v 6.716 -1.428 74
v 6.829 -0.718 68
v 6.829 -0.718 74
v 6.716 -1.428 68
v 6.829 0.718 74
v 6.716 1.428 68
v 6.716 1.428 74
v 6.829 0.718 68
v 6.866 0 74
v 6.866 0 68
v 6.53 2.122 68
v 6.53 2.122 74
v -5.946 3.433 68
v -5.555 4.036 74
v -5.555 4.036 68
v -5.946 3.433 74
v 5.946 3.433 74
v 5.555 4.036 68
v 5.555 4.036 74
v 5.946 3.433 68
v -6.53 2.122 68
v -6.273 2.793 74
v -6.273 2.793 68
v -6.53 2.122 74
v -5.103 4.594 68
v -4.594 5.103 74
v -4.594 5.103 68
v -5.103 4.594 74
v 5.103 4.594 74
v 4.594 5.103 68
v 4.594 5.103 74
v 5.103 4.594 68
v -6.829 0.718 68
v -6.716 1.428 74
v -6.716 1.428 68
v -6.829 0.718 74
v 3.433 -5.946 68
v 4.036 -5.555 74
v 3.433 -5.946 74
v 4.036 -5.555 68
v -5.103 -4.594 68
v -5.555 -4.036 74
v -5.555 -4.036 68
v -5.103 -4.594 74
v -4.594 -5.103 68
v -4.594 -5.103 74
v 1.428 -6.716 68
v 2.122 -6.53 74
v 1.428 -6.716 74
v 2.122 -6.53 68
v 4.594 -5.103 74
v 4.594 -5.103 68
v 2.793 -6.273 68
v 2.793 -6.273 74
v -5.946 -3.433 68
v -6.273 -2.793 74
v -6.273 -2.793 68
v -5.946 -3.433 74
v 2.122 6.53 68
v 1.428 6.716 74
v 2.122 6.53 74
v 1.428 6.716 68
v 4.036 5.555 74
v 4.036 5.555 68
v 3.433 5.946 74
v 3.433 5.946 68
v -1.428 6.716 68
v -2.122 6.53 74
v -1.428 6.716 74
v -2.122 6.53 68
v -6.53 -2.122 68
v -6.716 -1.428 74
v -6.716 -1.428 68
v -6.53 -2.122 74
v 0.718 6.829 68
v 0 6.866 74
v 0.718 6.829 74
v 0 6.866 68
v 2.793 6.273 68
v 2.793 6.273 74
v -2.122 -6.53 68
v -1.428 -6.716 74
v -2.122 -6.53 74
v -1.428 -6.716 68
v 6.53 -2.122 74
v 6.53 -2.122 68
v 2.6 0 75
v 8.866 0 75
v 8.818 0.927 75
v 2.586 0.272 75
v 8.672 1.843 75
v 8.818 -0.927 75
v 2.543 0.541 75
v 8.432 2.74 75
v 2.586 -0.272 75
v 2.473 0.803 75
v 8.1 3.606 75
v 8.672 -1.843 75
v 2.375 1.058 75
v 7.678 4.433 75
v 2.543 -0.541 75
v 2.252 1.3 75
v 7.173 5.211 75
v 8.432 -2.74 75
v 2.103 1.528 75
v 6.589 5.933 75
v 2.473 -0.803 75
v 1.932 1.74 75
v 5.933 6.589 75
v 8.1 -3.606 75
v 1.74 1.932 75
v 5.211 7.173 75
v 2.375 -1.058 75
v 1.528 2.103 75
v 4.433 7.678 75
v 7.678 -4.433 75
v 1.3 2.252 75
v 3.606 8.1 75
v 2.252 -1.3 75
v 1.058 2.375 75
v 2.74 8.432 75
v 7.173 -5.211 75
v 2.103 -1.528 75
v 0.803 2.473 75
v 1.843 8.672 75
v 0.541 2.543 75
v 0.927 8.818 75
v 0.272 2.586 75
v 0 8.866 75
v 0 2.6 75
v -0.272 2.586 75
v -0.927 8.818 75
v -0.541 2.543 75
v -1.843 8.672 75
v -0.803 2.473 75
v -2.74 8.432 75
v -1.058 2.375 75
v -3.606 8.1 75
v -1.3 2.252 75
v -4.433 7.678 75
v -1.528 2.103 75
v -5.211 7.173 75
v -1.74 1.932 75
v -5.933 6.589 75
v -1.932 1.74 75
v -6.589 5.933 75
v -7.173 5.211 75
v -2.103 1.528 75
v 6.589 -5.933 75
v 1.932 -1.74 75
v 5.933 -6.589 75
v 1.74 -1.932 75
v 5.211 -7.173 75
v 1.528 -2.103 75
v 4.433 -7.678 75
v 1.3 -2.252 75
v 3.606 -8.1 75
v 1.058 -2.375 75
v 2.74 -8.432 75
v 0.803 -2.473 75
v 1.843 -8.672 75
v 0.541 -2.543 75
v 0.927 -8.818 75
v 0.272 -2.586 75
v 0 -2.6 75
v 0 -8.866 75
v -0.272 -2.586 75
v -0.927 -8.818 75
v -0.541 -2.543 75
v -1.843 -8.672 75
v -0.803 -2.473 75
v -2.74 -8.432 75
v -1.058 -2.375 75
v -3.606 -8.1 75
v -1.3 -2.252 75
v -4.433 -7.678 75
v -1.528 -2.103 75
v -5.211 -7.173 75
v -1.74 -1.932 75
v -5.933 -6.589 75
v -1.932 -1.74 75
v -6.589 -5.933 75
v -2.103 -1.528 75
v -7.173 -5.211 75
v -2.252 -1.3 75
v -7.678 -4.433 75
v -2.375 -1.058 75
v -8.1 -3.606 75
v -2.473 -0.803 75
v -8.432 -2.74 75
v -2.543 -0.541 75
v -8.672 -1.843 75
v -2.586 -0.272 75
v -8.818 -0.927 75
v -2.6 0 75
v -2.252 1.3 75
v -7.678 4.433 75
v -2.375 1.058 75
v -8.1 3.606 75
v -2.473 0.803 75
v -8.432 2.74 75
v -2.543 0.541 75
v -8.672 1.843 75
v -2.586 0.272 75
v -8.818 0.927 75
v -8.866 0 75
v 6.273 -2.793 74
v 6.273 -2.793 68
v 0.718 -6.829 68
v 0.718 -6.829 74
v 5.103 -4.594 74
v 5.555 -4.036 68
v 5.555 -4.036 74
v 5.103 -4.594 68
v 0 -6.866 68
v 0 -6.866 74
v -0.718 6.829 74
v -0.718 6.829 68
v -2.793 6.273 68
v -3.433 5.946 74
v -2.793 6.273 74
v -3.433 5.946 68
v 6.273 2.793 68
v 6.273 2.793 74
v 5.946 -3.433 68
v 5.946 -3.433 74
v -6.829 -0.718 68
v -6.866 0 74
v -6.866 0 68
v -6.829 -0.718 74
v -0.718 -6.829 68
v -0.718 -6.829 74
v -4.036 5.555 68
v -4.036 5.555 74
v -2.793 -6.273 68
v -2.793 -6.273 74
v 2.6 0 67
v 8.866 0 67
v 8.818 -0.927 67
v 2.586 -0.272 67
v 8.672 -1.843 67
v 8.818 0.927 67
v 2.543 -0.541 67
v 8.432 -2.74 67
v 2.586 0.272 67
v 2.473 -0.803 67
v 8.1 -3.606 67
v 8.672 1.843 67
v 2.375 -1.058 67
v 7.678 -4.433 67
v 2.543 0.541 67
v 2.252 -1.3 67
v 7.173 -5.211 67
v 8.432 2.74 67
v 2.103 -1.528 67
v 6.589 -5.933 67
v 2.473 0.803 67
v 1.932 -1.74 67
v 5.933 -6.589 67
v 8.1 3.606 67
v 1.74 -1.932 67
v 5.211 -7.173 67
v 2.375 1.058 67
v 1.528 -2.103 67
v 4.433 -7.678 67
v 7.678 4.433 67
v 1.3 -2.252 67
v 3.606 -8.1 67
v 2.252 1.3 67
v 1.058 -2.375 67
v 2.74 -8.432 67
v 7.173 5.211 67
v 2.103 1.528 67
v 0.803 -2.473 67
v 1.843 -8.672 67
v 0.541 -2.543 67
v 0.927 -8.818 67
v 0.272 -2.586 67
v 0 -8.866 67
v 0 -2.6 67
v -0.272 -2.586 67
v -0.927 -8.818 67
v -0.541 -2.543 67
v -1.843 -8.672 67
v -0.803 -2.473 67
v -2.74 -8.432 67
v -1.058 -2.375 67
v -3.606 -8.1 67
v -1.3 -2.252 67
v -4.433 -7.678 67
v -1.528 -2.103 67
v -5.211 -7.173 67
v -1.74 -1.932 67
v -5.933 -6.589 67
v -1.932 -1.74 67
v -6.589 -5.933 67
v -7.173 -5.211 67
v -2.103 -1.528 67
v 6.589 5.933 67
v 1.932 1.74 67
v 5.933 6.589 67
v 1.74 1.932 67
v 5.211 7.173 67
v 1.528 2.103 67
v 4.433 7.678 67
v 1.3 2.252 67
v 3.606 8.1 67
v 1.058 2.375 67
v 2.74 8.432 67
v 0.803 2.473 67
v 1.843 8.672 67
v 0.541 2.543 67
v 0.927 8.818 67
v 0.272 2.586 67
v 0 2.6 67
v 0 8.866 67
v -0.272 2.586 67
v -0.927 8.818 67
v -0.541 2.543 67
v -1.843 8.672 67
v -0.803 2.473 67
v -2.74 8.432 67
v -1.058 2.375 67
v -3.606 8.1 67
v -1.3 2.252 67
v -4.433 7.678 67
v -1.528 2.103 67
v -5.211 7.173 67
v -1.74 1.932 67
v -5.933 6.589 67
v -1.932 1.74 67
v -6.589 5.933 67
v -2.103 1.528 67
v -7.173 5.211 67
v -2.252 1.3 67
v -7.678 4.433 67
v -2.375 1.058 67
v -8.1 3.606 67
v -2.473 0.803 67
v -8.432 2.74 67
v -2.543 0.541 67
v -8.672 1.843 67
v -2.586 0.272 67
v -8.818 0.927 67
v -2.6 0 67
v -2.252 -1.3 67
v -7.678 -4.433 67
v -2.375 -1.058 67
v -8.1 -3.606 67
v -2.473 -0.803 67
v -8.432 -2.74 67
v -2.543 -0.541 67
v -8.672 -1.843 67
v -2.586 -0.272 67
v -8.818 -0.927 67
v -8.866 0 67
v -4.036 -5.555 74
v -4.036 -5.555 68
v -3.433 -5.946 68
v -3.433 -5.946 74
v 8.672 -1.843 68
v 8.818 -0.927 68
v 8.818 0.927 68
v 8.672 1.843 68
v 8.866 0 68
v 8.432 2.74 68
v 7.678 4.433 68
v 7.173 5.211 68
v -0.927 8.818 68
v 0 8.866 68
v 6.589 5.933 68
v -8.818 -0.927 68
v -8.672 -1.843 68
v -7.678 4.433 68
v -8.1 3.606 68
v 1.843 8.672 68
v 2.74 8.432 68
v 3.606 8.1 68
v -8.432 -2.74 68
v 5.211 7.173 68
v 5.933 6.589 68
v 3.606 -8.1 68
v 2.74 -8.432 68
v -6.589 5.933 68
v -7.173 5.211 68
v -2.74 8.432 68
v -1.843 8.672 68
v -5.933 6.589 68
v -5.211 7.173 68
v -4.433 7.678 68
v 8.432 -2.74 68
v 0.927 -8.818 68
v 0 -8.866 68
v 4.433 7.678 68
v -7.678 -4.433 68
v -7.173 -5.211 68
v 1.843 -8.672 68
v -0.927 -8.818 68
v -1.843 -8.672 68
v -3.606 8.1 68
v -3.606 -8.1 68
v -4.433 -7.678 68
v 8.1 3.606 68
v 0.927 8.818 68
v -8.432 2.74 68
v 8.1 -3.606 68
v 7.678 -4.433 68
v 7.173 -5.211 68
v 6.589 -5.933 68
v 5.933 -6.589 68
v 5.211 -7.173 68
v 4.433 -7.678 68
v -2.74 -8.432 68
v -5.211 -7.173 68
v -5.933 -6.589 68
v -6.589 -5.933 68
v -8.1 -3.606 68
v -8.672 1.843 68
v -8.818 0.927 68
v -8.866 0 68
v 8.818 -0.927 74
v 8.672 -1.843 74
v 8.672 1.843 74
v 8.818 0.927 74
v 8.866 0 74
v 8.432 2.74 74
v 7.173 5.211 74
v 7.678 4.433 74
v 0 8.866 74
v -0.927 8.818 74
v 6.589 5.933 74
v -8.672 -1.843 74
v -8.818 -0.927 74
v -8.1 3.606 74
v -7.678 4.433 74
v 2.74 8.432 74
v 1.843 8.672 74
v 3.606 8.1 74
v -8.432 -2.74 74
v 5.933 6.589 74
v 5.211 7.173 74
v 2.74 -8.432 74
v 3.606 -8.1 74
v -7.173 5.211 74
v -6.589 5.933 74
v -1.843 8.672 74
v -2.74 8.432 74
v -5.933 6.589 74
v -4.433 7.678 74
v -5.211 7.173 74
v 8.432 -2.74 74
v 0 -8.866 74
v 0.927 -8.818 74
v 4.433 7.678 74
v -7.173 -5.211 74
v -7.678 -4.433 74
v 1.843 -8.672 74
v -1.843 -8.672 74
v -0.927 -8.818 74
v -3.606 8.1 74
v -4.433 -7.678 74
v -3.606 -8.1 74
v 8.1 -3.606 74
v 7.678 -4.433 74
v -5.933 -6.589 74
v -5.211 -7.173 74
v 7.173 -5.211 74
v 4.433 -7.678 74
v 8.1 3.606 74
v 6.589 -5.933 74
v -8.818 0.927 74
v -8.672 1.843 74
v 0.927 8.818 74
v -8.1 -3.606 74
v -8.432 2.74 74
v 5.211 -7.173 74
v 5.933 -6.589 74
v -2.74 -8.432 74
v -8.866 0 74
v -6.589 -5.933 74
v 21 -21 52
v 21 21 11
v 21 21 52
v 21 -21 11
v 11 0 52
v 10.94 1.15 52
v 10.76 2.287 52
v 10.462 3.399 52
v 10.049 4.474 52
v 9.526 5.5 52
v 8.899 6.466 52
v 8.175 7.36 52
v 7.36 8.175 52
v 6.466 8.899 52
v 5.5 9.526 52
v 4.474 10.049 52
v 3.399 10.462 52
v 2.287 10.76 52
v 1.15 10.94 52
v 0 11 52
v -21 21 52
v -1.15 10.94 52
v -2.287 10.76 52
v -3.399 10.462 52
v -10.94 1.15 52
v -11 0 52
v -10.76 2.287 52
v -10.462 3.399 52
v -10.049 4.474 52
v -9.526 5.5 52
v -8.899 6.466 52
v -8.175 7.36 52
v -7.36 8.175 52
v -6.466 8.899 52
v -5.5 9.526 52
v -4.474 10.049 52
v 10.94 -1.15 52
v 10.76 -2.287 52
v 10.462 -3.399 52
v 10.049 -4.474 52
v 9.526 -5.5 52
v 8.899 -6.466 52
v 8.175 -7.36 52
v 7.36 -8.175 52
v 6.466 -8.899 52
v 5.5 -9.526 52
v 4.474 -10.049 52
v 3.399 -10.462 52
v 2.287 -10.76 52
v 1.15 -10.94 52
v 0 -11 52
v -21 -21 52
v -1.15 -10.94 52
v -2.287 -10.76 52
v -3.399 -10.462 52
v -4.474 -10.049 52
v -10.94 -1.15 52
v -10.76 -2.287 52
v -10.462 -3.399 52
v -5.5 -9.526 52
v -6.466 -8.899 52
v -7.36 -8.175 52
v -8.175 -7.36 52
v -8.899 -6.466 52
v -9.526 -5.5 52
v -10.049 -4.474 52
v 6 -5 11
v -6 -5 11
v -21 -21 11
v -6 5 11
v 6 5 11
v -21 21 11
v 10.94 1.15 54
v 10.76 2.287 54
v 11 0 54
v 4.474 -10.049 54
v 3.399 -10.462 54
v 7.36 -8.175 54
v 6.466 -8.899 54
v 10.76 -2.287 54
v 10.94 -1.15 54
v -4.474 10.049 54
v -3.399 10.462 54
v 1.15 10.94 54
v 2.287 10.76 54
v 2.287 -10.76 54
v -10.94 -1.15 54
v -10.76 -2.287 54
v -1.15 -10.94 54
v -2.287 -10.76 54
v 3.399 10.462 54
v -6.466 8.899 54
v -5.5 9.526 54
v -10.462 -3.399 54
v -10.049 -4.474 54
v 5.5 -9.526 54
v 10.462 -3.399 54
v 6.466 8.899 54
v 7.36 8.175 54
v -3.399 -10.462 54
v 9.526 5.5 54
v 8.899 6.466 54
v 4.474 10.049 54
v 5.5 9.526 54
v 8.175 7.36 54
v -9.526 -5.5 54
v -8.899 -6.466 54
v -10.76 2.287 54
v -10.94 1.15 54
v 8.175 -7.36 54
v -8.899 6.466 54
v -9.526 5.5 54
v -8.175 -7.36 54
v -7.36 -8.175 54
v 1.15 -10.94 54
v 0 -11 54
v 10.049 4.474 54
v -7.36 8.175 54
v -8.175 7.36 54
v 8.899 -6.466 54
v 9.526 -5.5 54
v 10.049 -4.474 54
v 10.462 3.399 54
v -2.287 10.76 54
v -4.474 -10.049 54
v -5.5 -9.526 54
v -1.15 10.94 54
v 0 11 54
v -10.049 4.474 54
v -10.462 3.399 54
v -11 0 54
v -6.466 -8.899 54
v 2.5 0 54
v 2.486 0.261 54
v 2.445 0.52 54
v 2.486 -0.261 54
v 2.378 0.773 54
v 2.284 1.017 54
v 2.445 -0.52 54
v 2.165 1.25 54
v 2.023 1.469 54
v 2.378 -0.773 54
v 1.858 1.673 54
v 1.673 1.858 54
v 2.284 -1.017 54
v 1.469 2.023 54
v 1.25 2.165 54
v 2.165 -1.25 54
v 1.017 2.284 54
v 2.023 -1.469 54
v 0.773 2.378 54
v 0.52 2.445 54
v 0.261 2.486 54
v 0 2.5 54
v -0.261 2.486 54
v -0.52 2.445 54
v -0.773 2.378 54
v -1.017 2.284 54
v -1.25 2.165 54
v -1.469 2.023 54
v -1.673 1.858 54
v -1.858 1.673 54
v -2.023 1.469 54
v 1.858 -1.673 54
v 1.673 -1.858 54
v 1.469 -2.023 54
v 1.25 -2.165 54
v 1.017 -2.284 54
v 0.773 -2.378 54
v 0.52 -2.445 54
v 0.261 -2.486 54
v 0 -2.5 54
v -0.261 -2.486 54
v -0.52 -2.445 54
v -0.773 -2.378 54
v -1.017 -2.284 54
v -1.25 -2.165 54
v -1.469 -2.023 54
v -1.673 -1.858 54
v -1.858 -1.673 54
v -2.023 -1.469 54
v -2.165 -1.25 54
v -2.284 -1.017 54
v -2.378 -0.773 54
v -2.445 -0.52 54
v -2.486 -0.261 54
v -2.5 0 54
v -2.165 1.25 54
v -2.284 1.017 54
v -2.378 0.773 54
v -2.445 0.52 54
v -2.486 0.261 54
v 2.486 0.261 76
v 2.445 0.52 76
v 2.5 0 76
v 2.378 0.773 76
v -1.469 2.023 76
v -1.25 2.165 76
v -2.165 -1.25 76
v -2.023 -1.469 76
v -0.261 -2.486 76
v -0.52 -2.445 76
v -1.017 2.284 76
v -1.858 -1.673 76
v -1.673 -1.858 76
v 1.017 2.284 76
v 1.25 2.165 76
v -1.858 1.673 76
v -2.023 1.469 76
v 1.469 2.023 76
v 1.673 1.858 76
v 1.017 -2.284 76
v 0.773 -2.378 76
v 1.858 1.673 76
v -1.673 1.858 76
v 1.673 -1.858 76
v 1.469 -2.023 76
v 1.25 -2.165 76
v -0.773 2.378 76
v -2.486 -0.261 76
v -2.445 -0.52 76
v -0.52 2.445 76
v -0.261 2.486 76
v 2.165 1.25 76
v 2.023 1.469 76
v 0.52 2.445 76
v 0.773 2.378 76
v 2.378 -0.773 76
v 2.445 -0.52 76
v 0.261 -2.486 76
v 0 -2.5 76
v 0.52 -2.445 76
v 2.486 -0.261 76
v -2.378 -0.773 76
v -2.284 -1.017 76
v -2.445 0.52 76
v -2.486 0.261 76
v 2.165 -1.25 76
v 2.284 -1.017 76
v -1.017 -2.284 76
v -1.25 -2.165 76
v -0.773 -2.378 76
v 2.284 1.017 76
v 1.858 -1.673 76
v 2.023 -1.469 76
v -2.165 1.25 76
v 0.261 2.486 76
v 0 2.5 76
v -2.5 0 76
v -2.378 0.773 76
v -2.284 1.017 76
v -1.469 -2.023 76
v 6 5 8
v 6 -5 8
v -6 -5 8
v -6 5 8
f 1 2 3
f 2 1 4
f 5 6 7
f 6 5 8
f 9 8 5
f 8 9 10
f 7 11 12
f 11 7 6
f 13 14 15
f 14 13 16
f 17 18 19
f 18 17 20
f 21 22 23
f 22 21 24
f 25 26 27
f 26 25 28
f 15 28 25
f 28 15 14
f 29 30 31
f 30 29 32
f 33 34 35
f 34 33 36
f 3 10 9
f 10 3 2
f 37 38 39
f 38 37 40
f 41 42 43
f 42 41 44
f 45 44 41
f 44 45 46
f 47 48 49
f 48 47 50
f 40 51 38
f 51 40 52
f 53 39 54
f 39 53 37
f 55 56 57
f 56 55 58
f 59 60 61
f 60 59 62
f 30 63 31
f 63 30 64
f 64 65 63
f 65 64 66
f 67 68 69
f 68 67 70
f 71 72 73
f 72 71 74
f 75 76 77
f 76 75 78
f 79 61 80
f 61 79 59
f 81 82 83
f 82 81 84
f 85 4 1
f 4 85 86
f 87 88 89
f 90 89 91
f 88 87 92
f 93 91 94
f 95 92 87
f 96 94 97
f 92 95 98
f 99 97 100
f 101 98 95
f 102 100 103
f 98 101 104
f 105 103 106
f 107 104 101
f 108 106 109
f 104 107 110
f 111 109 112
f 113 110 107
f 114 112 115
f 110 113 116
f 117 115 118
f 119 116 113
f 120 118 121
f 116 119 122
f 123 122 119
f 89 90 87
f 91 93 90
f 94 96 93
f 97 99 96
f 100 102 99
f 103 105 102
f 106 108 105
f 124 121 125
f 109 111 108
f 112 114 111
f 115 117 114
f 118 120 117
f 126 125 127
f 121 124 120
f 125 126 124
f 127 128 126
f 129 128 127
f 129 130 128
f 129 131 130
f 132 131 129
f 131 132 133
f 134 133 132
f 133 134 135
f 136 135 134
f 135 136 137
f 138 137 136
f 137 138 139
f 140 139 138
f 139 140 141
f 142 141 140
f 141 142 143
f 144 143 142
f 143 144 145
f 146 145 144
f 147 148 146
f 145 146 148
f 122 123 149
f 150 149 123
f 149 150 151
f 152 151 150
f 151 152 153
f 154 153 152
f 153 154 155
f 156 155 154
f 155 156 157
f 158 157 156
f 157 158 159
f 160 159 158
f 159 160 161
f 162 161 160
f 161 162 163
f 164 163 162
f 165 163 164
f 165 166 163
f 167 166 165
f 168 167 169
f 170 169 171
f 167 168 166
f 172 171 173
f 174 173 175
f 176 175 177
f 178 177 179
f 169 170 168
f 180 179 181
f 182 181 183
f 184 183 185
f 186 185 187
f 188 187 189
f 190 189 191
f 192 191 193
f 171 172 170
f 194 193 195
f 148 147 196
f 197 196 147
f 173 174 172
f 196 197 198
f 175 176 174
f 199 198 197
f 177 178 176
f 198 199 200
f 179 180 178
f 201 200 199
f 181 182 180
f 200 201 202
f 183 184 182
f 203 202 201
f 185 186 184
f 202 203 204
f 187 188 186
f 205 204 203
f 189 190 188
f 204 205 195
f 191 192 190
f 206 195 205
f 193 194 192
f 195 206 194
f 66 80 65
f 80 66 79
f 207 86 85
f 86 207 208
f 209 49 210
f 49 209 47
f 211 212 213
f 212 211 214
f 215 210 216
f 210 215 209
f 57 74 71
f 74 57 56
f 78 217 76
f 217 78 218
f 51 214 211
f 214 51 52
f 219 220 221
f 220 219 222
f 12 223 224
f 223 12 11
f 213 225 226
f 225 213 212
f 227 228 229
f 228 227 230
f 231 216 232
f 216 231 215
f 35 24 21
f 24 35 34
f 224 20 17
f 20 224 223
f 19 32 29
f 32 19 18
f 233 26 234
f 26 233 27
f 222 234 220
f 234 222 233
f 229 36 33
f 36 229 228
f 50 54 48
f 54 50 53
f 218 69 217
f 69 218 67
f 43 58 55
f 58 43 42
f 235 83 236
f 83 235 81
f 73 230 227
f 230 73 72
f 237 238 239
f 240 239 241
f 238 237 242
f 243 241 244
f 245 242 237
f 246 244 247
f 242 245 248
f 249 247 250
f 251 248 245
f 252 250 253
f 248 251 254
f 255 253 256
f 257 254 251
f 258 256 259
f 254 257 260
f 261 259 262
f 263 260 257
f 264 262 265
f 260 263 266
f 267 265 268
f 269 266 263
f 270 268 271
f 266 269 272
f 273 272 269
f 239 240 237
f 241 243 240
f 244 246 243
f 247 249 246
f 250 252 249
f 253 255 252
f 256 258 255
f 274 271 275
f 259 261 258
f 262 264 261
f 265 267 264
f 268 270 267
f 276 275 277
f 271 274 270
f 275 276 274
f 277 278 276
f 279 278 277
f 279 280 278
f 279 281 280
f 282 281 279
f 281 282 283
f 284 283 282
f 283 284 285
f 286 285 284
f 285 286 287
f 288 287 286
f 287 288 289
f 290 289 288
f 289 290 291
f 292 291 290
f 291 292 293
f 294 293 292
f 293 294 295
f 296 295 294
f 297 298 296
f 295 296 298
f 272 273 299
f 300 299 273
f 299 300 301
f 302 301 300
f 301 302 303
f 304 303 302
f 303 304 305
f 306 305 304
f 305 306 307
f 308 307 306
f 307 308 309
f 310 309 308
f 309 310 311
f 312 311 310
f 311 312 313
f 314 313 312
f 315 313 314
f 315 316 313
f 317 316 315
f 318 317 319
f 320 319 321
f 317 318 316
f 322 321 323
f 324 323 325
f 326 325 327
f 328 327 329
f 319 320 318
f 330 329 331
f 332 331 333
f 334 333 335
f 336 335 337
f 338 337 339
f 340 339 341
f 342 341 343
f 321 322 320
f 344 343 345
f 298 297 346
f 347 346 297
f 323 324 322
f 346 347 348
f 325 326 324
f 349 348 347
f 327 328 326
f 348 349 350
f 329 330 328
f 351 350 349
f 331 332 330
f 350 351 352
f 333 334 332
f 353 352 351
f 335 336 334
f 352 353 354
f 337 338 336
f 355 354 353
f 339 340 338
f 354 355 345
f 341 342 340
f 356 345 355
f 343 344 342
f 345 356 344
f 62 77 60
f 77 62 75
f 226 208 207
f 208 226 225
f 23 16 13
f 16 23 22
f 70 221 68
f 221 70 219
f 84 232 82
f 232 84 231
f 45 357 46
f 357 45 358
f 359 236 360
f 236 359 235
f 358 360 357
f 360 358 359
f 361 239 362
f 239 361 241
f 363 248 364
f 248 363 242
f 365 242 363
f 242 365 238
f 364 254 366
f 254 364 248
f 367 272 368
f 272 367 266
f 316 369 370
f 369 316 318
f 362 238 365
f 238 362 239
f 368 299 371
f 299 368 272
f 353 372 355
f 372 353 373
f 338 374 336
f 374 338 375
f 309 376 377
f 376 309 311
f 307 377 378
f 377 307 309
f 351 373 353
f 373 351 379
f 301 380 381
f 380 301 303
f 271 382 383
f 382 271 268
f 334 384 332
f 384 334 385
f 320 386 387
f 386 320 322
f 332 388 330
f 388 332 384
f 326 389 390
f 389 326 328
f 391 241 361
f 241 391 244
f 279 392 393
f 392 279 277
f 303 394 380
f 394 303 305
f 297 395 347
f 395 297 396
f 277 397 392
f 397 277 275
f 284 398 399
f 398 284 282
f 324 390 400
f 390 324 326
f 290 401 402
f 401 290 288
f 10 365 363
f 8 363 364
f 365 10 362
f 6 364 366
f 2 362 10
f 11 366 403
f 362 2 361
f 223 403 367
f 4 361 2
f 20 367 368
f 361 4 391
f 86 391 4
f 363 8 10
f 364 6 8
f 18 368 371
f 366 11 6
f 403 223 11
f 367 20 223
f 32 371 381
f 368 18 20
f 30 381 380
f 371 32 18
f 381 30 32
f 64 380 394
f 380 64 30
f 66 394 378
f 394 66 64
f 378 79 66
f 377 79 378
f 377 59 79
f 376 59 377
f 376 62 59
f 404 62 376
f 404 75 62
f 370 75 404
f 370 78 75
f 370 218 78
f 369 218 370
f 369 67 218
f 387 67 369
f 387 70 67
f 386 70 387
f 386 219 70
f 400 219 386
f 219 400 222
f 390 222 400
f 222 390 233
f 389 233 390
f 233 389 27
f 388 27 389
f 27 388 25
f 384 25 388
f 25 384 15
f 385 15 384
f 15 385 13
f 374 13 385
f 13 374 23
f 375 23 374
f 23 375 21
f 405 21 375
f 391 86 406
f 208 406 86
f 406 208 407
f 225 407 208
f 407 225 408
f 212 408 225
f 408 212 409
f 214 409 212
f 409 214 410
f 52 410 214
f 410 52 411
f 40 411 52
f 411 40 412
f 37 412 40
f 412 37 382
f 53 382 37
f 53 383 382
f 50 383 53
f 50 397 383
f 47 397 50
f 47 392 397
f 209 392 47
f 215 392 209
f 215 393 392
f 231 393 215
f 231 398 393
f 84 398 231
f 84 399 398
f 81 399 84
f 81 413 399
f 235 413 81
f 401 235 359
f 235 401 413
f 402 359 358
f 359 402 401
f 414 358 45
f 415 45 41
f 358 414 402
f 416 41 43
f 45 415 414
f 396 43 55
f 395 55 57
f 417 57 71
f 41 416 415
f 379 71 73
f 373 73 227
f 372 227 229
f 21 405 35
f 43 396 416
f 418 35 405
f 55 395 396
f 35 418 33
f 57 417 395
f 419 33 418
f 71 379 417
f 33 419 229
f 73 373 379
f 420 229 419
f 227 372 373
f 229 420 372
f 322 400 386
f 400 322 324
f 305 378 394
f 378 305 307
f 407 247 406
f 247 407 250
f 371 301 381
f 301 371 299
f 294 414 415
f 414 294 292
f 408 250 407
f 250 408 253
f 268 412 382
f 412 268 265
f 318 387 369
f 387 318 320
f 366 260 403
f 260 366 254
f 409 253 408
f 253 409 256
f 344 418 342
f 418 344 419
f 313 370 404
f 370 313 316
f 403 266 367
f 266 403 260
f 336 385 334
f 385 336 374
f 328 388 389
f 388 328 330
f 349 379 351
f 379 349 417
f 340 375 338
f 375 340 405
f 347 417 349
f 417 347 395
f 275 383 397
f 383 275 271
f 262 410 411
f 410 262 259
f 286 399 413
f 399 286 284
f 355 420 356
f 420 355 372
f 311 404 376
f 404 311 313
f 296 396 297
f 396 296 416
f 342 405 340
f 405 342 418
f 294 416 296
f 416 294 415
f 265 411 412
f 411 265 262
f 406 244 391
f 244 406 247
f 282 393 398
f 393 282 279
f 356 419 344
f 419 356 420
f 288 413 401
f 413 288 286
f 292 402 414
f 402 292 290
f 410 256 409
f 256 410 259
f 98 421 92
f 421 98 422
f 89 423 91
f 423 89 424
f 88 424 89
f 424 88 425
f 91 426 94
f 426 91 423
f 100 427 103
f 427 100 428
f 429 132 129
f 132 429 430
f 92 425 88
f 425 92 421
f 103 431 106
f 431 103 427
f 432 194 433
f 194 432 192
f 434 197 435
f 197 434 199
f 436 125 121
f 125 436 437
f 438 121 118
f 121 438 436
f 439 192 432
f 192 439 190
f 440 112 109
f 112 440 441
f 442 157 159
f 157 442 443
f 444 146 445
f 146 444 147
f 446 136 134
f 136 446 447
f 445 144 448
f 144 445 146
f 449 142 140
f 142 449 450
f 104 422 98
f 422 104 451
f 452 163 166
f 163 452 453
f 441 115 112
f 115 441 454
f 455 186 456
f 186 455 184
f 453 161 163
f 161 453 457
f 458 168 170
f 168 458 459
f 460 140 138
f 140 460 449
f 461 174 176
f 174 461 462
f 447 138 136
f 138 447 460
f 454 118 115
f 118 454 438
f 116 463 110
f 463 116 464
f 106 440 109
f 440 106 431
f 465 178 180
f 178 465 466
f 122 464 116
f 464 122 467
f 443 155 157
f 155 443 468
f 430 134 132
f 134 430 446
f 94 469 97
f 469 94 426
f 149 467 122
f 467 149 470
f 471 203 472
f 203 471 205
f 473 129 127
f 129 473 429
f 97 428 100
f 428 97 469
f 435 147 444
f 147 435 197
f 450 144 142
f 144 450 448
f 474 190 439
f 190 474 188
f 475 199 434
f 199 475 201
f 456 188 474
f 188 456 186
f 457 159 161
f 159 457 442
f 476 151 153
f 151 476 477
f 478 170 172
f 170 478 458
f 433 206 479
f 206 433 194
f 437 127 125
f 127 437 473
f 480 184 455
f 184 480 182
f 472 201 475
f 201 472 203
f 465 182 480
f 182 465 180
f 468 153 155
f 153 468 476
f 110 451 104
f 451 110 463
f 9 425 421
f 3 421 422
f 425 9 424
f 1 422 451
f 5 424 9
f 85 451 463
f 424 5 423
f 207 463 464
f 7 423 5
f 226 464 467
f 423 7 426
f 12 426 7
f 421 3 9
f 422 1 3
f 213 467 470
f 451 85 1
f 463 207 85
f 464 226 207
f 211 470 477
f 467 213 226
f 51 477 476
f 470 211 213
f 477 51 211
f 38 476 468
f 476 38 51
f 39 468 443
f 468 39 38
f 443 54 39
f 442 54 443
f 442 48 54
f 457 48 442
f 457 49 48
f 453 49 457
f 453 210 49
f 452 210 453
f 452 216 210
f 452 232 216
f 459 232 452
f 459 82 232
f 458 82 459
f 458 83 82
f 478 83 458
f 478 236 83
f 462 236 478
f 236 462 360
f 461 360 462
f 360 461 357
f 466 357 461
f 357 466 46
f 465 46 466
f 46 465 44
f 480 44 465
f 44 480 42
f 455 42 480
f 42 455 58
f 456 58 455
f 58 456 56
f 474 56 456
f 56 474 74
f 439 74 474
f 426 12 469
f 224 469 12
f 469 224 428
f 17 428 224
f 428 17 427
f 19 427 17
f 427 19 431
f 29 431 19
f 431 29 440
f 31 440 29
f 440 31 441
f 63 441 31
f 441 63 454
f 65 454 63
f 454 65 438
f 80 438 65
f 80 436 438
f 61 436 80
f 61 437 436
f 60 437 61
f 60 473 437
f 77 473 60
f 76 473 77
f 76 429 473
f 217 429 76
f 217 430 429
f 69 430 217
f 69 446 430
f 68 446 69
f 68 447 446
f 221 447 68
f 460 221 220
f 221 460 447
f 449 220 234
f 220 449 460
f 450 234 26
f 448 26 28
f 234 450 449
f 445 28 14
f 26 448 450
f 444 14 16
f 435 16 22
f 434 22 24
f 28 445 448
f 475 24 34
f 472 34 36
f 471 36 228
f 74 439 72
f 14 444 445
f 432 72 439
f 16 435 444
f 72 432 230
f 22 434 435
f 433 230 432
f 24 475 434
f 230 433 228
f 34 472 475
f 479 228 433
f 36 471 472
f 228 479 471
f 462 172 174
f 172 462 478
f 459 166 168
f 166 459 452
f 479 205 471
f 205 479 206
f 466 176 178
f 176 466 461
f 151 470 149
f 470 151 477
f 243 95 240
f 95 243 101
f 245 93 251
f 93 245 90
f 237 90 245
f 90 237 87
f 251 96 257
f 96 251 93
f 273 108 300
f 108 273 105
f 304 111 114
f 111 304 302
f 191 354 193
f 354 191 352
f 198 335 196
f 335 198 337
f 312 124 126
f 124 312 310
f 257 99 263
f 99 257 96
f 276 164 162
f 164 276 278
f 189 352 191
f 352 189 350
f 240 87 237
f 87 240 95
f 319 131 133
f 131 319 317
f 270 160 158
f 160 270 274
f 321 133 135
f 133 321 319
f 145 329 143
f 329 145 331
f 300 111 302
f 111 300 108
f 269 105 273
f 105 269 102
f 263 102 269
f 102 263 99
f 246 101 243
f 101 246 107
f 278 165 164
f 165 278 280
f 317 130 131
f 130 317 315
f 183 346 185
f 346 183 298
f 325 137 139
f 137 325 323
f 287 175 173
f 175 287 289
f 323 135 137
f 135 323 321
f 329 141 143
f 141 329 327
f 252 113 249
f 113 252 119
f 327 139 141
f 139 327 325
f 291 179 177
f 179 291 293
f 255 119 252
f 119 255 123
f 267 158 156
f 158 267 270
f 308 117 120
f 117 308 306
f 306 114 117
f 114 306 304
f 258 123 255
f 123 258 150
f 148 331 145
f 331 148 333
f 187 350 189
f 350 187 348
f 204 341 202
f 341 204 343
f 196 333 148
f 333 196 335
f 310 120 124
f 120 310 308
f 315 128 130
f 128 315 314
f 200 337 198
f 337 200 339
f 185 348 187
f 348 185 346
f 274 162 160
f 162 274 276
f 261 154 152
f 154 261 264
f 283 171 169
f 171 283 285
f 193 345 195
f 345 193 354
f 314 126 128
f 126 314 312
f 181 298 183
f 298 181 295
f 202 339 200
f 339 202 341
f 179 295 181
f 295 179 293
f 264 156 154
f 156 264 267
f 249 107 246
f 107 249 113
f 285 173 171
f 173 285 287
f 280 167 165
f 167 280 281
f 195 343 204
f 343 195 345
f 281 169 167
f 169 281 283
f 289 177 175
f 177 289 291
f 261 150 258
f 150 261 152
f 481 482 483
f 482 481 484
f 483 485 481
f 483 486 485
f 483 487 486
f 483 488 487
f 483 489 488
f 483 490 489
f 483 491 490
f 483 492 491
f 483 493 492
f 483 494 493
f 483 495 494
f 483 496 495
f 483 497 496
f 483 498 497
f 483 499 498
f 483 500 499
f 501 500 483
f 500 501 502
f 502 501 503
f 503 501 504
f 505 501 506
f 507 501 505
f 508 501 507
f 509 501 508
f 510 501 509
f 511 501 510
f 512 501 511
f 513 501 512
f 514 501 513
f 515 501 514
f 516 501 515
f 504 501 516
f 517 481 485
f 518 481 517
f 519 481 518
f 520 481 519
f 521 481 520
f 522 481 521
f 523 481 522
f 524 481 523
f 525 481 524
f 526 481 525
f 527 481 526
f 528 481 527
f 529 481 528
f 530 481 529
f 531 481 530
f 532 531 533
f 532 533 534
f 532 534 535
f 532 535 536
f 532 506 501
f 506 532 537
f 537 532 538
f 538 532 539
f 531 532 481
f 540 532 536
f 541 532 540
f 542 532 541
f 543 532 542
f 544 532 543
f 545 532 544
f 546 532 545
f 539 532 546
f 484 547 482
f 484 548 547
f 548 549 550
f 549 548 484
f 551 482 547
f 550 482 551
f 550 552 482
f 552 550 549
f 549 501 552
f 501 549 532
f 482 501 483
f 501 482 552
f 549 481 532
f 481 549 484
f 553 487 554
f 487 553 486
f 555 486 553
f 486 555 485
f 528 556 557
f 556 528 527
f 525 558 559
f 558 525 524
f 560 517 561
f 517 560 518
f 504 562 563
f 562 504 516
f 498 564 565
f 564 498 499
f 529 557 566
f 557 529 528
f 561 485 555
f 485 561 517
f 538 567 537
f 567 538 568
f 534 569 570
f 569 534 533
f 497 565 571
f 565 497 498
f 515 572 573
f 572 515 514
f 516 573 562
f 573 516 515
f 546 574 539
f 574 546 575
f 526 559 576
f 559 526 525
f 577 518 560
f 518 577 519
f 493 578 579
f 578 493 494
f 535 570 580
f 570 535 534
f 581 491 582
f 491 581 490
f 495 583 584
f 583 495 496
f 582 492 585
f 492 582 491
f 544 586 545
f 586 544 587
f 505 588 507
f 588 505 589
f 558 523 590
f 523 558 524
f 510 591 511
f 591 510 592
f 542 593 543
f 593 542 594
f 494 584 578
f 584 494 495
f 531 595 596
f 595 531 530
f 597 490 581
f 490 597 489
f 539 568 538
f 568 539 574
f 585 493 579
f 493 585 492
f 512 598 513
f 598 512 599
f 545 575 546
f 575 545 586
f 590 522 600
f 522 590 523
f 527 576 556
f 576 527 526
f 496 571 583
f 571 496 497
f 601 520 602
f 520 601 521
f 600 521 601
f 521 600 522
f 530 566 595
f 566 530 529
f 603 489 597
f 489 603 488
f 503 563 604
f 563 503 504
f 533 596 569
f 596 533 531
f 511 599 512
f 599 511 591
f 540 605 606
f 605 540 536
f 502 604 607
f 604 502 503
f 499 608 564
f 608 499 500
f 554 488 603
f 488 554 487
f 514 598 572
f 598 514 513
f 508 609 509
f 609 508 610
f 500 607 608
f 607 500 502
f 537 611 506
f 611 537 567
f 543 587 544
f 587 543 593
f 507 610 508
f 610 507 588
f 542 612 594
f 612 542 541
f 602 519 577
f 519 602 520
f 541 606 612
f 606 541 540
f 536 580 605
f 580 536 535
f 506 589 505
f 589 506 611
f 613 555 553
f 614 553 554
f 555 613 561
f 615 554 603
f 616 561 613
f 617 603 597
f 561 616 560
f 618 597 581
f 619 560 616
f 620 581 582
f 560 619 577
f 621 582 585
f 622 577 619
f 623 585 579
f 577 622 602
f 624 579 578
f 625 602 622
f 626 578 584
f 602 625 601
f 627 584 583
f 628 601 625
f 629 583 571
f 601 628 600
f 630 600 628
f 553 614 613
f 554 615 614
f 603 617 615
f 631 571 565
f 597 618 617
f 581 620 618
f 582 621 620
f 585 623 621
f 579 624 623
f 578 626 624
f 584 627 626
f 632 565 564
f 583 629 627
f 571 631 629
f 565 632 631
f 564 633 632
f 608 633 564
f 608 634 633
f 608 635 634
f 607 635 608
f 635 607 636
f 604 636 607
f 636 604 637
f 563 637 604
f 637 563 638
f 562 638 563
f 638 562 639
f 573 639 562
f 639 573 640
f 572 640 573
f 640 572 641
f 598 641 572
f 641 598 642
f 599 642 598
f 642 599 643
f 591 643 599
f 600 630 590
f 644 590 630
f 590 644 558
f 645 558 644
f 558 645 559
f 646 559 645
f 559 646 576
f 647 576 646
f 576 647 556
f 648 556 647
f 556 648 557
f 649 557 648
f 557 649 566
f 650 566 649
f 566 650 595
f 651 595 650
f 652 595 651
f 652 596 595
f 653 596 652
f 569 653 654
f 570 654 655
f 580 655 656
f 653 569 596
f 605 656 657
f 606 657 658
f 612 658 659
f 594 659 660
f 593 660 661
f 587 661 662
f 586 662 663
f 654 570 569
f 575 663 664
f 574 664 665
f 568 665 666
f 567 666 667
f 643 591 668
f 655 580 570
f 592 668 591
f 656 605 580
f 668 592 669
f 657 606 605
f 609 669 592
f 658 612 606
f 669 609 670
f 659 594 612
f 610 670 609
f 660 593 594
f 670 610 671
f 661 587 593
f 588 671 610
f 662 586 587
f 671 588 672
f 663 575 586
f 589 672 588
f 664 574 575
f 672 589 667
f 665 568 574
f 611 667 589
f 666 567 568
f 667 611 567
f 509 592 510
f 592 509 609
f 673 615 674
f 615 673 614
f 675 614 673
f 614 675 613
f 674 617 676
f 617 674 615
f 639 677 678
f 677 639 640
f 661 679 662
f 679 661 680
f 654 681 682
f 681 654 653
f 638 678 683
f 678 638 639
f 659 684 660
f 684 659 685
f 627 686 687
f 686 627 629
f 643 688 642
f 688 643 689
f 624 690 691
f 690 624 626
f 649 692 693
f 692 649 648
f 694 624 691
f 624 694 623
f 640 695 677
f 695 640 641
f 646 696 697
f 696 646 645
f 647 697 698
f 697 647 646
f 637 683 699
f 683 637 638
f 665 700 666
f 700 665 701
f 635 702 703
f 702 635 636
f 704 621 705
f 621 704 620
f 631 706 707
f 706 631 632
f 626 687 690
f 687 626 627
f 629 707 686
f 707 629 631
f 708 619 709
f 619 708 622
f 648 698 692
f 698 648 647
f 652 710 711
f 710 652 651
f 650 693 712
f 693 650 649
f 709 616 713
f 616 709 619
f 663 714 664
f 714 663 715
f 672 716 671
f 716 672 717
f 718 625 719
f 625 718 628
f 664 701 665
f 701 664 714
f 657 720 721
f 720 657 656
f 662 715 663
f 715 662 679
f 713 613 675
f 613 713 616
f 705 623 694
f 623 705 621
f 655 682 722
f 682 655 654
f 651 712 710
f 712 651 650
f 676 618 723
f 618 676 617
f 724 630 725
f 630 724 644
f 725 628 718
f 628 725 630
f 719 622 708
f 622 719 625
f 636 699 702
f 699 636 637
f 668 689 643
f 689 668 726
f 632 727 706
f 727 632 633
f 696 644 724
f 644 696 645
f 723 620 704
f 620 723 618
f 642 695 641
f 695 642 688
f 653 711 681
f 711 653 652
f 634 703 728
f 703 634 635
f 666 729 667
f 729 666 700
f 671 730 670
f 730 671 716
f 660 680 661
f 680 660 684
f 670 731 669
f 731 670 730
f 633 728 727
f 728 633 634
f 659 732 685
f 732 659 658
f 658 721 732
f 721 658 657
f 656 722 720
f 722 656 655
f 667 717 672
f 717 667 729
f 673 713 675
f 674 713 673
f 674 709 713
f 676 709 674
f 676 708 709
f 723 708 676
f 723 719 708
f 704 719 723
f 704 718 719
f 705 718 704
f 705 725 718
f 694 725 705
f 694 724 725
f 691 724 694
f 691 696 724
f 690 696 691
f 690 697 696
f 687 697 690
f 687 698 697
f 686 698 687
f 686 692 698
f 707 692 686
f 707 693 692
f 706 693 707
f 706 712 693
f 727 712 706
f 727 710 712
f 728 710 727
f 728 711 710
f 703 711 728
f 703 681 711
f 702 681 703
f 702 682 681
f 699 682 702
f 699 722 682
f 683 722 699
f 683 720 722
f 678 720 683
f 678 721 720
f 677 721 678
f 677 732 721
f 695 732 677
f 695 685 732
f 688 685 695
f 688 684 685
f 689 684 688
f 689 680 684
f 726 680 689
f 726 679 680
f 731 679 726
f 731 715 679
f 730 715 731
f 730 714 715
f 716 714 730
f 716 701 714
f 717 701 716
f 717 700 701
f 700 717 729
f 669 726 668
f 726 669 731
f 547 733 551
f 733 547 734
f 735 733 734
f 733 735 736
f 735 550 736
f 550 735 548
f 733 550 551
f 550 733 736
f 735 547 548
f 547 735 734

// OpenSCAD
// file: _params.scad
// =========================================================================
// 공유 파라미터 (모든 개별 부품 파일에서 include)
// 메인 어셈블리: cup_z_x_catrage_frame_water_mic_anti_3030.scad 에서 추출
// 프레임: 600 × 420 × 700mm (3030 프로파일, Y=0 대칭)
// =========================================================================

$fn = 60;  // 부품 출력용 고해상도
GLOBAL_TOLERANCE = 0.2;

// --- [1] 하부 기성품 및 원통 파라미터 ---
X_RAIL_LEN = 290.0;
X_BLOCK_W = 30.0; X_BLOCK_L = 32.0;   // 신규 X슬라이더 블록 (폭 30mm × 길이 32mm)
X_PITCH_X = 20.0; X_PITCH_Y = 20.0;   // 체결 홀 피치 (20 × 20mm, M3 나사탭 4개)
X_RAIL_W = 30.0;  X_RAIL_H = 20.0;   // 레일 폭 30mm (레일 바닥~블록 윗면 높이 29mm 반영)
X_TOTAL_H = 29.0;                    // 레일 바닥에서 슬라이더 블록 윗면까지의 높이

MOTOR_W = 42.0;      MOTOR_PITCH = 31.0; MOTOR_HOLE_D = 3.5;    
MOTOR_BOSS_D = 22.0; MOTOR_BOSS_H = 2.0; SCREW_D = 8.0;         
MOT_BODY_L = 41.0;   SHAFT_L = 24.0;     // 실측 NEMA17 몸통 41mm / 축 돌출 24mm

CUP_ID = 99.5;  CUP_WALL = 5.0; CUP_OD = 110.0;     // 아크릴 원통 OD110/ID100
CUP_H = 180.0;   CAGE_H = 60.0;  FLOOR_H = 10.0; PISTON_H = 20.0;     

LIP_D = 30.0;    LIP_H = 5.0;    LEAK_DRAIN_D = 4.0;    
GUIDE_PIPE_D = 8.0; BUSHING_OD = 12.0; BUSHING_H = 8.0;       
DRAIN_RADIUS = 35.0; DRAIN_D = 8.0;        

Y_OFFSET = 85.0; BRKT_H = 12.0; BRKT_D = 122.0; BRKT_ID = 62.0; Z_MOUNT_PCD = 86.0;   

// --- [2] 아크릴 파이프 및 상부 카트리지 ---
ACRYL_ID = 100.0; ACRYL_T = 5.0; ACRYL_OD = ACRYL_ID + (ACRYL_T * 2);  // OD110 (아크릴집 106 재고없음 → 컵과 동일 규격)

REVOLVER_PCD = 240.0;     // 인접 카트리지 웹 9.8mm 확보 (OD110 대응, 230→240)
CARTRIDGE_OD = REVOLVER_PCD + ACRYL_OD + 8; 
TOP_PLATE_H = 15.0;       // 아크릴 15T 통판 (보스홀 단 깊이 10mm)

HUB_D = 60.0;            
SHAFT_D = 12.0;          
HUB_WALL = 4.0;          
HUB_H = 15.0;             // 아크릴 5T × 3장 적층 — 파이프 130mm 대응
POCKET_DEPTH = 5.0;
MID_HUB_Z = 63.5;          // 중단 허브 하면 Z (벨트 중심 Z=71.0mm 정렬, 풀리 상단 Z=75.0mm = 축상단-1mm)
UPPER_HUB_Z = 135.0;       // 상단 허브 하면 Z (전체 135+15=150 유지)
BOSS_OD = 35.0;
BOSS_H = 11.0;             // 보스11 + 와셔1 = 12, 리세스10 → 허브 2mm 공중

// --- [3] GT2 벨트 구동 시스템 ---
GT2_PITCH     = 2.0;
GT2_BELT_W    = 6.0;
BIG_PULLEY_TEETH = 566;
BIG_PULLEY_PD = BIG_PULLEY_TEETH * GT2_PITCH / PI;
BIG_PULLEY_OD = BIG_PULLEY_PD + 1.0;
SMALL_PULLEY_TEETH = 20;
SMALL_PULLEY_PD = SMALL_PULLEY_TEETH * GT2_PITCH / PI;
SMALL_PULLEY_OD = SMALL_PULLEY_PD + 1.0;

BELT_MOTOR_X = -300;
BELT_MOTOR_Y = -155.5;
BRKT_MOTOR_H = 25.0;
BRKT_MOTOR_W = 45.0;        // 브래킷 폭 45mm (프로파일 간섭 회피 복원)
SLOT_LEN = 10.0;
FLAG_W = 15.0;  FLAG_H = 8.0;  FLAG_T = 1.5;

X_POS_MEASURE = 170.0;   // 측정 브래킷 X좌표 (X_M~X_R 정중앙, X대칭)

// --- [4] 3030 프레임 경계 (600×430×700mm) ---
PF = 30;             // 3030 알루미늄 프로파일
WASHER_T = 1.0;     

X_L = -320;
X_M = 60;
X_R = 250;
Y_F = -210;          // 전방 (대칭: -210+30=-180, Y=0 중심)
Y_B = 180;           // 후방 (대칭: 180+30=210, Y=0 중심) — 메인파일과 동기화

Z_BOT = -480;
Z_RAIL = -322;
Z_MID = -TOP_PLATE_H - PF;
Z_TOP = 220;

SUPPORT_PILLAR_H = Z_TOP - PF;

SHAFT_SQ = 20;       // 2020 사각 회전축

// 사각 축 홀 크기
SQ = SHAFT_SQ + GLOBAL_TOLERANCE;  // 20.2mm

// --- 리볼버/컵 축 정렬 (보스홀=판 중심에 리볼버 정렬) ---
REVOLVER_CX = (X_L + X_M + PF)/2;        // 판 중심 = 보스홀 = 리볼버 회전축 (-115)
DROP_X      = REVOLVER_CX + REVOLVER_PCD/2;  // 링 드롭 / 컵 적재 축 (+5)

FLANGE_Z = 52.0;       // 모터 전면 안착 높이 (Z=52mm -> 축 상단 Z=76mm, 풀리 결합)

// --- [5] 모터 체결홀 (이미 제작 완료된 15T 상판 원본 도면 수치 100% 유지) ---
MOTOR_BOLT_PITCH     = 25.0;      // Y피치 (Y = ±12.5mm)
MOTOR_BOLT_X_NOMINAL = X_L + 55;  // 1열: 상판 좌단 55 (모터축 기준 +35mm = X=-265mm)
MOTOR_BOLT_X_SHIFT   = X_L + 40;  // 2열: 상판 좌단 40 (모터축 기준 +20mm = X=-280mm)

// 모터 마운트 볼트 카운터보어 (단볼트용 — 브래킷 두께 25 중 깊게 파냄)
MOTOR_CB_D     = 6.5;            // M3 캡볼트 머리 클리어런스
MOTOR_CB_DEPTH = 19;             // 카운터보어 깊이 (잔여 통과 6mm → M3×10 단볼트)
// main file
// =========================================================================
// [구매] 벨트 구동 모터 + 풀리 세트 (타워 마운트 높이 반영)
// 구매: NEMA17 (42×42×43) + GT2 20T 풀리 + GT2 타이밍벨트
// 원점: 브래킷 바닥면(상판 접촉면) = Z=0, 축 상향
// =========================================================================
include <_params.scad>

FLANGE_Z = 52.0;    // 타워 플랜지 높이 (모터 전면 위치 Z=52mm -> 축 상단 Z=76mm)
MOT_BODY_L = 41.0;  // 실측 NEMA 17 모터 몸통 높이 (41mm)
SHAFT_L = 24;
PULLEY_Z = 67.0;    // GT2 풀리 바닥 Z=67.0mm (플랜지 포함 풀리 상단 Z=75.0mm = 축 상단 Z=76.0mm보다 1.0mm 낮춤)

// ── ① NEMA 17 모터 본체 (전면이 Z=42mm에 안착, 몸통은 아래로 위치) ──
color([0.1, 0.1, 0.1])
    translate([-MOTOR_W/2, -MOTOR_W/2, FLANGE_Z - MOT_BODY_L])
        cube([MOTOR_W, MOTOR_W, MOT_BODY_L]);

// ── ② 모터 보스 (ø22 × 2mm, Z=42mm 상면) ──
color([0.25, 0.25, 0.25])
    translate([0, 0, FLANGE_Z])
        cylinder(d=MOTOR_BOSS_D, h=MOTOR_BOSS_H);

// ── ③ 모터 축 (상면에서 위로 돌출, Z=42~66mm) ──
color([0.7, 0.7, 0.7])
    translate([0, 0, FLANGE_Z])
        cylinder(d=5, h=SHAFT_L);

// ── ④ GT2 20치 풀리 (Z=73.5mm, 벨트 라인 정렬) ──
color([0.8, 0.75, 0.1]) translate([0, 0, PULLEY_Z]) difference() {
    union() {
        cylinder(d=SMALL_PULLEY_OD, h=GT2_BELT_W + 2);
        cylinder(d=SMALL_PULLEY_OD + 4, h=1);               // 하부 플랜지
        translate([0, 0, GT2_BELT_W + 1])
            cylinder(d=SMALL_PULLEY_OD + 4, h=1);           // 상부 플랜지
    }
    translate([0, 0, -1]) cylinder(d=5.2, h=GT2_BELT_W + 4);
}

// ── ⑤ 배선 커넥터 (모터 하면) ──
color([0.9, 0.9, 0.9])
    translate([-6, -5, FLANGE_Z - MOT_BODY_L - 3])
        cube([12, 10, 3]);
